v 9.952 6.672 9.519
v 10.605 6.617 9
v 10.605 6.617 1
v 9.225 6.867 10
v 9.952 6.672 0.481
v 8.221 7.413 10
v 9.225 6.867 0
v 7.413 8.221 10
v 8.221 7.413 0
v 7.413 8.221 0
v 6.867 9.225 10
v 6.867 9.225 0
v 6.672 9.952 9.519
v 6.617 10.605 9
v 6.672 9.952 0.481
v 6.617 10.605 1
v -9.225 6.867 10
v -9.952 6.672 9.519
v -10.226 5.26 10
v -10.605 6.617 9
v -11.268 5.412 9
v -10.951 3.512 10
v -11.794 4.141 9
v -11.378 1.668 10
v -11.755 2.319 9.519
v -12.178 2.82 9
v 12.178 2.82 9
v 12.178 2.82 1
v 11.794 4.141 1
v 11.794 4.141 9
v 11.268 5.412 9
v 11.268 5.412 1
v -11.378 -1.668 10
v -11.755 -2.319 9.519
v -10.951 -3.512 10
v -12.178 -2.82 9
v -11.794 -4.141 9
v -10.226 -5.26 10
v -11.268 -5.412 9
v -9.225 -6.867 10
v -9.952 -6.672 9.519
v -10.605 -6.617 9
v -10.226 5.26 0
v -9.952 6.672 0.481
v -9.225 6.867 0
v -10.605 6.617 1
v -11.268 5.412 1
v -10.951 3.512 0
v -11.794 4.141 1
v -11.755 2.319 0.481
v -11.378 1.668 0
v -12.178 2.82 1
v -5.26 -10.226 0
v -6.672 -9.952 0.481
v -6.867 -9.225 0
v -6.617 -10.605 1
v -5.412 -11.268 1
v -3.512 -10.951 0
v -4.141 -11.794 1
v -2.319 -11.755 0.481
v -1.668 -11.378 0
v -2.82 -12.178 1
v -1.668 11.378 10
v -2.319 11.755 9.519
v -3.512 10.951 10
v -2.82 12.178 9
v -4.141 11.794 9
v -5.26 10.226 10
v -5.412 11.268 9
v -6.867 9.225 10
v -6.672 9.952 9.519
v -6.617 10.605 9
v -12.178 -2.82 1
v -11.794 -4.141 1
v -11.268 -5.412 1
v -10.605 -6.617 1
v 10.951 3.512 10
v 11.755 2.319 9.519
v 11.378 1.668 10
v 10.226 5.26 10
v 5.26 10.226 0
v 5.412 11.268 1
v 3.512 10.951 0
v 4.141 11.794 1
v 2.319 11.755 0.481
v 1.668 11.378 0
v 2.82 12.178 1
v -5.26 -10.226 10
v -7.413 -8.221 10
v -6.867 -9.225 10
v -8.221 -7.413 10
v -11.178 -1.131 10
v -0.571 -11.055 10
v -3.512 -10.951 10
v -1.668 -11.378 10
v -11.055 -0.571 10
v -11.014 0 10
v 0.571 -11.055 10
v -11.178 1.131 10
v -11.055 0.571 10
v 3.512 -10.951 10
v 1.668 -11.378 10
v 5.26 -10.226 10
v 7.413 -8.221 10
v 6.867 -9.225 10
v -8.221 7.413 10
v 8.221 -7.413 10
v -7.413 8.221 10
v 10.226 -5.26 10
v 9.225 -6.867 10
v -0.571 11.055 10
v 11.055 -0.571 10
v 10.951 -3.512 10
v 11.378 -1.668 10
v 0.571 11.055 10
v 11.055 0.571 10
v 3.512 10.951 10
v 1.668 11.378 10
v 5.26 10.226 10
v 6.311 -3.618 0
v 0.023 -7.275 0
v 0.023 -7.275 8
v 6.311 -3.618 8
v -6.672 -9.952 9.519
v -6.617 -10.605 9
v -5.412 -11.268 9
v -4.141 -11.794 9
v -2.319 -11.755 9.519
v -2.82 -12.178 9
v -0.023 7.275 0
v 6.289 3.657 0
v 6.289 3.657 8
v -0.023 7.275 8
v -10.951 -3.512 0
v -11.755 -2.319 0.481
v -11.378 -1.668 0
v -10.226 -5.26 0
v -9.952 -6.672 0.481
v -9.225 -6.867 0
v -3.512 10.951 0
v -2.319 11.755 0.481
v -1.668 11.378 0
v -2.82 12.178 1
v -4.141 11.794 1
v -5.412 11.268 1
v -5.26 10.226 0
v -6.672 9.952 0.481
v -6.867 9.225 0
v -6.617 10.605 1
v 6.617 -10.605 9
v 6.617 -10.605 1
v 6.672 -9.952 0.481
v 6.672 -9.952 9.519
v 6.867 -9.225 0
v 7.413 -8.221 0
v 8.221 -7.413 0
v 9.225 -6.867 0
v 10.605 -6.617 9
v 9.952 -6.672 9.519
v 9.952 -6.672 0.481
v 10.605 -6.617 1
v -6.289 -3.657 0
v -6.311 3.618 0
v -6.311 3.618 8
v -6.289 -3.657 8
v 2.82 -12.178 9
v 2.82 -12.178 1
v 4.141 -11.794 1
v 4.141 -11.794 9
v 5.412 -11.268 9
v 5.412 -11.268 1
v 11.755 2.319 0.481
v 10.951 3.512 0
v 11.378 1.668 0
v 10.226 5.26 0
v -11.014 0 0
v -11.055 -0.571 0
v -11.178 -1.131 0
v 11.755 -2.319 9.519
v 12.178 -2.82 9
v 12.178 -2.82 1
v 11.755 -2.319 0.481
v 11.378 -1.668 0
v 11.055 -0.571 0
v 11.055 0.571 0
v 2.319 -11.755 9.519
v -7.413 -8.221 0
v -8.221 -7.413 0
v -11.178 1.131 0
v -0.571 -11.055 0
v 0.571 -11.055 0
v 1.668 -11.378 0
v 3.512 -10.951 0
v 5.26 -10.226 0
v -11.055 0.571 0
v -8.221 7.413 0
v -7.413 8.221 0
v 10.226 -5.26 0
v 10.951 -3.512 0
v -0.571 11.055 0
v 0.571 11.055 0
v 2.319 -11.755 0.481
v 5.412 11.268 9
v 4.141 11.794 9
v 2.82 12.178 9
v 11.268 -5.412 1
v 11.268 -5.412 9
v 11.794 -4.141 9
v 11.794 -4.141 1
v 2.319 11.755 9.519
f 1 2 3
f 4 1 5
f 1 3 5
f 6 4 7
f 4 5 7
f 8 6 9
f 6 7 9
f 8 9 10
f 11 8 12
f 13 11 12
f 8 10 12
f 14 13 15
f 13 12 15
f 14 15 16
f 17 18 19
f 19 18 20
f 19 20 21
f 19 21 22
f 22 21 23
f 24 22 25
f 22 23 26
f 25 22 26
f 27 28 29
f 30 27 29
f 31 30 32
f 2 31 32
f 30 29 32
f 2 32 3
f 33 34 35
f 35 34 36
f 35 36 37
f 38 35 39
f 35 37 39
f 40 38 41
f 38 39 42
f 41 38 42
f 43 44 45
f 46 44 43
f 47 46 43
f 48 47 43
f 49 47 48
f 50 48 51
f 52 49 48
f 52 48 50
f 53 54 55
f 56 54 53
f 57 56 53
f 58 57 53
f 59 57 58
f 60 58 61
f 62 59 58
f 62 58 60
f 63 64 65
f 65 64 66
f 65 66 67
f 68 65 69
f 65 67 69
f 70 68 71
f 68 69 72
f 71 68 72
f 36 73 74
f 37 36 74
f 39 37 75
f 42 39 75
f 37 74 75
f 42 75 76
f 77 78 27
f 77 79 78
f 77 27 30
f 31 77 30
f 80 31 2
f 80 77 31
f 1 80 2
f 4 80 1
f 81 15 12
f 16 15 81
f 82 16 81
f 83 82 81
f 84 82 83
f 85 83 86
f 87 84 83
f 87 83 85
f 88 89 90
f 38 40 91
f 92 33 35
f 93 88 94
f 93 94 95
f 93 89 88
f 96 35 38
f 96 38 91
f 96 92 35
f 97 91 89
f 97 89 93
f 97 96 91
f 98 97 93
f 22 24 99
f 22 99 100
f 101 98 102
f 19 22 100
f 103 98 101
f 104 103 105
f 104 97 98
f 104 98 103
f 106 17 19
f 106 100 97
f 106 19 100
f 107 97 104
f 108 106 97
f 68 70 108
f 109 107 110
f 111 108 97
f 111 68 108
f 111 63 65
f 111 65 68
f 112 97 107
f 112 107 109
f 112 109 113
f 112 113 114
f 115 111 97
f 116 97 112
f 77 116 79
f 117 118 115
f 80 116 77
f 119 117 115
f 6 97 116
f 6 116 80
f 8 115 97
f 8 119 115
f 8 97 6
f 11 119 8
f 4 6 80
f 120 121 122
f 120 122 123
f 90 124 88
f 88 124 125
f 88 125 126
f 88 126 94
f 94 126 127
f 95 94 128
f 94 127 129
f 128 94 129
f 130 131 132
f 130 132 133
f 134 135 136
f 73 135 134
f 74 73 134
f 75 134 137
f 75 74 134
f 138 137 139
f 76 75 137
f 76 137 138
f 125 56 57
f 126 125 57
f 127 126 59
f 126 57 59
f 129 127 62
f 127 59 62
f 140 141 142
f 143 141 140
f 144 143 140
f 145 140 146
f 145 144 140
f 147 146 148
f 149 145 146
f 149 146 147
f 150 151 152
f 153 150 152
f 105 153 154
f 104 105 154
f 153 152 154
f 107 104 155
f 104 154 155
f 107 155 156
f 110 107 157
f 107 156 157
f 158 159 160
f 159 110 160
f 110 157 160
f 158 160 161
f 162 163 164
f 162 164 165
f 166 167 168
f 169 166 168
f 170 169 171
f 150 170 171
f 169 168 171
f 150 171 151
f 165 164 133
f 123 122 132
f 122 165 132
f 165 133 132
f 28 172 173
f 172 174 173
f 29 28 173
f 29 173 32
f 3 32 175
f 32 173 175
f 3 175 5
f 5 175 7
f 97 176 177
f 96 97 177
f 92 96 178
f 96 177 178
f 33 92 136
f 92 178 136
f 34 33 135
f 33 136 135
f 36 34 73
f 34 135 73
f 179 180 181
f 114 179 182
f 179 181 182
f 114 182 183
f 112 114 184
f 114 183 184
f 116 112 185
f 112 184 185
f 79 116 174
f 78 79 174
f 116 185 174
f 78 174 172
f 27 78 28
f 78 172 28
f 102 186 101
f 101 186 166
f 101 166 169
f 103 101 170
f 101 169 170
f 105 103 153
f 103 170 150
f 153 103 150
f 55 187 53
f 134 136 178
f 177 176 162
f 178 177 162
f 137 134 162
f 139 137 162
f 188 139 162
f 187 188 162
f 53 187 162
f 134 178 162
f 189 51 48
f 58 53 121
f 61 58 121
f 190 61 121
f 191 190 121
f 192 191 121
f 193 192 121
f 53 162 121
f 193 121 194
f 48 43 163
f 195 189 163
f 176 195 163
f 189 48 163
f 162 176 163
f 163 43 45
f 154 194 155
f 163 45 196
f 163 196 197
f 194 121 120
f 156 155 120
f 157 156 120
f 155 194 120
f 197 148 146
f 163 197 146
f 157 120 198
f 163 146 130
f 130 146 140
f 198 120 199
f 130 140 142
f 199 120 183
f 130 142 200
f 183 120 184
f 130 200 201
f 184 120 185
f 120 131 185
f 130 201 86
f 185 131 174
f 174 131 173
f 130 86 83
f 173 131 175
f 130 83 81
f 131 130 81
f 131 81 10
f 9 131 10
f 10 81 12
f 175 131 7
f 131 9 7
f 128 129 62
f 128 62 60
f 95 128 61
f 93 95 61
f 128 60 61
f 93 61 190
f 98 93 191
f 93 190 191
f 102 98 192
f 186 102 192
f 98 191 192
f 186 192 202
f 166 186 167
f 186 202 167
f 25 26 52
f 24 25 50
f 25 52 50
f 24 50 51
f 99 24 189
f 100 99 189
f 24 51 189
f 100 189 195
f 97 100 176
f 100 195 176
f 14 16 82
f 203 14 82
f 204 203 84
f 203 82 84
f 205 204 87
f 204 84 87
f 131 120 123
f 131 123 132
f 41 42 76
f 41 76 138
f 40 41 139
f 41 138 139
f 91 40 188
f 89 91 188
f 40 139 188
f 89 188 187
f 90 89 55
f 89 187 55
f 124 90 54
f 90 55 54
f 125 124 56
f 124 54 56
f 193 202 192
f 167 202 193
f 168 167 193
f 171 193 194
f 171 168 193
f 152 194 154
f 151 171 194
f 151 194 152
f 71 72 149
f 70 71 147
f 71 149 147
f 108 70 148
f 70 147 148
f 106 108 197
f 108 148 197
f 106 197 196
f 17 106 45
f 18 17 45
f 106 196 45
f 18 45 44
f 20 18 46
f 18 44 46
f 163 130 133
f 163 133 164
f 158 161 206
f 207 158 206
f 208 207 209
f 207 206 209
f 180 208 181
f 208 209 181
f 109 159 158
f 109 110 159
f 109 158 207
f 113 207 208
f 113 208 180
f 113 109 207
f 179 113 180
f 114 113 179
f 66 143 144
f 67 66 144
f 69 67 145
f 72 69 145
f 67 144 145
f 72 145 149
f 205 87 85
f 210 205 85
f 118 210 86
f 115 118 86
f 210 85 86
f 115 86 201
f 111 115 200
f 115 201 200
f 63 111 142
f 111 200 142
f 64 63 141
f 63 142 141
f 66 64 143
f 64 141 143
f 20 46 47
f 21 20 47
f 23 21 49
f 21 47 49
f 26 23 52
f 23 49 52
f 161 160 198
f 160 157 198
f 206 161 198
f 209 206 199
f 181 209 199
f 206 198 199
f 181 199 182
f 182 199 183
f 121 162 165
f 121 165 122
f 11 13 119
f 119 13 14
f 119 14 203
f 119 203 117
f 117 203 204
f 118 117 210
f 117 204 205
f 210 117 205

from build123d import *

# Parameters (mm, degrees)
F1_DEPTH = 10
F2_DEPTH = 8
F3_SIZE  = 1


with BuildPart() as f1:
    # F0 (on Top) → F1 (new body)
    with BuildSketch(Plane.XY):
        with BuildLine():
            ThreePointArc((12.1776870536, -2.8202726863), (11.0142451748, 0), (12.1776870536, 2.8202726863))
            ThreePointArc((12.1776870536, 2.8202726863), (11.5484941564, 4.7835429046), (10.605159036, 6.6166911535))
            ThreePointArc((10.605159036, 6.6166911535), (7.7882474528, 7.7882474528), (6.6166911535, 10.605159036))
            ThreePointArc((6.6166911535, 10.605159036), (4.7835429046, 11.5484941564), (2.8202726863, 12.1776870536))
            ThreePointArc((2.8202726863, 12.1776870536), (0, 11.0142451748), (-2.8202726863, 12.1776870536))
            ThreePointArc((-2.8202726863, 12.1776870536), (-4.7835429046, 11.5484941564), (-6.6166911535, 10.605159036))
            ThreePointArc((-6.6166911535, 10.605159036), (-7.7882474528, 7.7882474528), (-10.605159036, 6.6166911535))
            ThreePointArc((-10.605159036, 6.6166911535), (-11.5484941564, 4.7835429046), (-12.1776870536, 2.8202726863))
            ThreePointArc((-12.1776870536, 2.8202726863), (-11.3165274676, 1.5254126516), (-11.0142451748, 0))
            ThreePointArc((-11.0142451748, 0), (-11.3165274676, -1.5254126516), (-12.1776870536, -2.8202726863))
            ThreePointArc((-12.1776870536, -2.8202726863), (-11.5484941564, -4.7835429046), (-10.605159036, -6.6166911535))
            ThreePointArc((-10.605159036, -6.6166911535), (-7.7882474528, -7.7882474528), (-6.6166911535, -10.605159036))
            ThreePointArc((-6.6166911535, -10.605159036), (-4.7835429046, -11.5484941564), (-2.8202726863, -12.1776870536))
            ThreePointArc((-2.8202726863, -12.1776870536), (0, -11.0142451748), (2.8202726863, -12.1776870536))
            ThreePointArc((2.8202726863, -12.1776870536), (4.7835429046, -11.5484941564), (6.6166911535, -10.605159036))
            ThreePointArc((6.6166911535, -10.605159036), (7.7882474528, -7.7882474528), (10.605159036, -6.6166911535))
            ThreePointArc((10.605159036, -6.6166911535), (11.5484941564, -4.7835429046), (12.1776870536, -2.8202726863))
        make_face()
        Polygon((6.2885942892, 3.6569908211), (6.3113440971, -3.617586998), (0.0227498078, -7.2745778191), (-6.2885942892, -3.6569908211), (-6.3113440971, 3.617586998), (-0.0227498078, 7.2745778191), align=None, mode=Mode.SUBTRACT)
        Polygon((0.0227498078, -7.2745778191), (6.3113440971, -3.617586998), (6.2885942892, 3.6569908211), (-0.0227498078, 7.2745778191), (-6.3113440971, 3.617586998), (-6.2885942892, -3.6569908211), align=None)
    extrude(amount=F1_DEPTH)

    # F0 (on Top) → F2 (cut)
    with BuildSketch(Plane.XY):
        Polygon((0.0227498078, -7.2745778191), (6.3113440971, -3.617586998), (6.2885942892, 3.6569908211), (-0.0227498078, 7.2745778191), (-6.3113440971, 3.617586998), (-6.2885942892, -3.6569908211), align=None)
    extrude(amount=F2_DEPTH, mode=Mode.SUBTRACT)

    # F3
    f3_edges = [f1.edges().sort_by_distance(p)[0] for p in [
        (11.548494, -4.783543, 10),
        (11.548494, 4.783543, 10),
        (4.783543, 11.548494, 10),
        (-4.783543, 11.548494, 10),
        (-11.548494, 4.783543, 10),
        (-11.548494, -4.783543, 10),
        (-4.783543, -11.548494, 10),
        (4.783543, -11.548494, 10),
        (4.783543, -11.548494, 0),
        (11.548494, -4.783543, 0),
        (11.548494, 4.783543, 0),
        (4.783543, 11.548494, 0),
        (-4.783543, 11.548494, 0),
        (-11.548494, 4.783543, 0),
        (-11.548494, -4.783543, 0),
        (-4.783543, -11.548494, 0),
    ]]
    chamfer(f3_edges, length=F3_SIZE)


solid = f1.part
